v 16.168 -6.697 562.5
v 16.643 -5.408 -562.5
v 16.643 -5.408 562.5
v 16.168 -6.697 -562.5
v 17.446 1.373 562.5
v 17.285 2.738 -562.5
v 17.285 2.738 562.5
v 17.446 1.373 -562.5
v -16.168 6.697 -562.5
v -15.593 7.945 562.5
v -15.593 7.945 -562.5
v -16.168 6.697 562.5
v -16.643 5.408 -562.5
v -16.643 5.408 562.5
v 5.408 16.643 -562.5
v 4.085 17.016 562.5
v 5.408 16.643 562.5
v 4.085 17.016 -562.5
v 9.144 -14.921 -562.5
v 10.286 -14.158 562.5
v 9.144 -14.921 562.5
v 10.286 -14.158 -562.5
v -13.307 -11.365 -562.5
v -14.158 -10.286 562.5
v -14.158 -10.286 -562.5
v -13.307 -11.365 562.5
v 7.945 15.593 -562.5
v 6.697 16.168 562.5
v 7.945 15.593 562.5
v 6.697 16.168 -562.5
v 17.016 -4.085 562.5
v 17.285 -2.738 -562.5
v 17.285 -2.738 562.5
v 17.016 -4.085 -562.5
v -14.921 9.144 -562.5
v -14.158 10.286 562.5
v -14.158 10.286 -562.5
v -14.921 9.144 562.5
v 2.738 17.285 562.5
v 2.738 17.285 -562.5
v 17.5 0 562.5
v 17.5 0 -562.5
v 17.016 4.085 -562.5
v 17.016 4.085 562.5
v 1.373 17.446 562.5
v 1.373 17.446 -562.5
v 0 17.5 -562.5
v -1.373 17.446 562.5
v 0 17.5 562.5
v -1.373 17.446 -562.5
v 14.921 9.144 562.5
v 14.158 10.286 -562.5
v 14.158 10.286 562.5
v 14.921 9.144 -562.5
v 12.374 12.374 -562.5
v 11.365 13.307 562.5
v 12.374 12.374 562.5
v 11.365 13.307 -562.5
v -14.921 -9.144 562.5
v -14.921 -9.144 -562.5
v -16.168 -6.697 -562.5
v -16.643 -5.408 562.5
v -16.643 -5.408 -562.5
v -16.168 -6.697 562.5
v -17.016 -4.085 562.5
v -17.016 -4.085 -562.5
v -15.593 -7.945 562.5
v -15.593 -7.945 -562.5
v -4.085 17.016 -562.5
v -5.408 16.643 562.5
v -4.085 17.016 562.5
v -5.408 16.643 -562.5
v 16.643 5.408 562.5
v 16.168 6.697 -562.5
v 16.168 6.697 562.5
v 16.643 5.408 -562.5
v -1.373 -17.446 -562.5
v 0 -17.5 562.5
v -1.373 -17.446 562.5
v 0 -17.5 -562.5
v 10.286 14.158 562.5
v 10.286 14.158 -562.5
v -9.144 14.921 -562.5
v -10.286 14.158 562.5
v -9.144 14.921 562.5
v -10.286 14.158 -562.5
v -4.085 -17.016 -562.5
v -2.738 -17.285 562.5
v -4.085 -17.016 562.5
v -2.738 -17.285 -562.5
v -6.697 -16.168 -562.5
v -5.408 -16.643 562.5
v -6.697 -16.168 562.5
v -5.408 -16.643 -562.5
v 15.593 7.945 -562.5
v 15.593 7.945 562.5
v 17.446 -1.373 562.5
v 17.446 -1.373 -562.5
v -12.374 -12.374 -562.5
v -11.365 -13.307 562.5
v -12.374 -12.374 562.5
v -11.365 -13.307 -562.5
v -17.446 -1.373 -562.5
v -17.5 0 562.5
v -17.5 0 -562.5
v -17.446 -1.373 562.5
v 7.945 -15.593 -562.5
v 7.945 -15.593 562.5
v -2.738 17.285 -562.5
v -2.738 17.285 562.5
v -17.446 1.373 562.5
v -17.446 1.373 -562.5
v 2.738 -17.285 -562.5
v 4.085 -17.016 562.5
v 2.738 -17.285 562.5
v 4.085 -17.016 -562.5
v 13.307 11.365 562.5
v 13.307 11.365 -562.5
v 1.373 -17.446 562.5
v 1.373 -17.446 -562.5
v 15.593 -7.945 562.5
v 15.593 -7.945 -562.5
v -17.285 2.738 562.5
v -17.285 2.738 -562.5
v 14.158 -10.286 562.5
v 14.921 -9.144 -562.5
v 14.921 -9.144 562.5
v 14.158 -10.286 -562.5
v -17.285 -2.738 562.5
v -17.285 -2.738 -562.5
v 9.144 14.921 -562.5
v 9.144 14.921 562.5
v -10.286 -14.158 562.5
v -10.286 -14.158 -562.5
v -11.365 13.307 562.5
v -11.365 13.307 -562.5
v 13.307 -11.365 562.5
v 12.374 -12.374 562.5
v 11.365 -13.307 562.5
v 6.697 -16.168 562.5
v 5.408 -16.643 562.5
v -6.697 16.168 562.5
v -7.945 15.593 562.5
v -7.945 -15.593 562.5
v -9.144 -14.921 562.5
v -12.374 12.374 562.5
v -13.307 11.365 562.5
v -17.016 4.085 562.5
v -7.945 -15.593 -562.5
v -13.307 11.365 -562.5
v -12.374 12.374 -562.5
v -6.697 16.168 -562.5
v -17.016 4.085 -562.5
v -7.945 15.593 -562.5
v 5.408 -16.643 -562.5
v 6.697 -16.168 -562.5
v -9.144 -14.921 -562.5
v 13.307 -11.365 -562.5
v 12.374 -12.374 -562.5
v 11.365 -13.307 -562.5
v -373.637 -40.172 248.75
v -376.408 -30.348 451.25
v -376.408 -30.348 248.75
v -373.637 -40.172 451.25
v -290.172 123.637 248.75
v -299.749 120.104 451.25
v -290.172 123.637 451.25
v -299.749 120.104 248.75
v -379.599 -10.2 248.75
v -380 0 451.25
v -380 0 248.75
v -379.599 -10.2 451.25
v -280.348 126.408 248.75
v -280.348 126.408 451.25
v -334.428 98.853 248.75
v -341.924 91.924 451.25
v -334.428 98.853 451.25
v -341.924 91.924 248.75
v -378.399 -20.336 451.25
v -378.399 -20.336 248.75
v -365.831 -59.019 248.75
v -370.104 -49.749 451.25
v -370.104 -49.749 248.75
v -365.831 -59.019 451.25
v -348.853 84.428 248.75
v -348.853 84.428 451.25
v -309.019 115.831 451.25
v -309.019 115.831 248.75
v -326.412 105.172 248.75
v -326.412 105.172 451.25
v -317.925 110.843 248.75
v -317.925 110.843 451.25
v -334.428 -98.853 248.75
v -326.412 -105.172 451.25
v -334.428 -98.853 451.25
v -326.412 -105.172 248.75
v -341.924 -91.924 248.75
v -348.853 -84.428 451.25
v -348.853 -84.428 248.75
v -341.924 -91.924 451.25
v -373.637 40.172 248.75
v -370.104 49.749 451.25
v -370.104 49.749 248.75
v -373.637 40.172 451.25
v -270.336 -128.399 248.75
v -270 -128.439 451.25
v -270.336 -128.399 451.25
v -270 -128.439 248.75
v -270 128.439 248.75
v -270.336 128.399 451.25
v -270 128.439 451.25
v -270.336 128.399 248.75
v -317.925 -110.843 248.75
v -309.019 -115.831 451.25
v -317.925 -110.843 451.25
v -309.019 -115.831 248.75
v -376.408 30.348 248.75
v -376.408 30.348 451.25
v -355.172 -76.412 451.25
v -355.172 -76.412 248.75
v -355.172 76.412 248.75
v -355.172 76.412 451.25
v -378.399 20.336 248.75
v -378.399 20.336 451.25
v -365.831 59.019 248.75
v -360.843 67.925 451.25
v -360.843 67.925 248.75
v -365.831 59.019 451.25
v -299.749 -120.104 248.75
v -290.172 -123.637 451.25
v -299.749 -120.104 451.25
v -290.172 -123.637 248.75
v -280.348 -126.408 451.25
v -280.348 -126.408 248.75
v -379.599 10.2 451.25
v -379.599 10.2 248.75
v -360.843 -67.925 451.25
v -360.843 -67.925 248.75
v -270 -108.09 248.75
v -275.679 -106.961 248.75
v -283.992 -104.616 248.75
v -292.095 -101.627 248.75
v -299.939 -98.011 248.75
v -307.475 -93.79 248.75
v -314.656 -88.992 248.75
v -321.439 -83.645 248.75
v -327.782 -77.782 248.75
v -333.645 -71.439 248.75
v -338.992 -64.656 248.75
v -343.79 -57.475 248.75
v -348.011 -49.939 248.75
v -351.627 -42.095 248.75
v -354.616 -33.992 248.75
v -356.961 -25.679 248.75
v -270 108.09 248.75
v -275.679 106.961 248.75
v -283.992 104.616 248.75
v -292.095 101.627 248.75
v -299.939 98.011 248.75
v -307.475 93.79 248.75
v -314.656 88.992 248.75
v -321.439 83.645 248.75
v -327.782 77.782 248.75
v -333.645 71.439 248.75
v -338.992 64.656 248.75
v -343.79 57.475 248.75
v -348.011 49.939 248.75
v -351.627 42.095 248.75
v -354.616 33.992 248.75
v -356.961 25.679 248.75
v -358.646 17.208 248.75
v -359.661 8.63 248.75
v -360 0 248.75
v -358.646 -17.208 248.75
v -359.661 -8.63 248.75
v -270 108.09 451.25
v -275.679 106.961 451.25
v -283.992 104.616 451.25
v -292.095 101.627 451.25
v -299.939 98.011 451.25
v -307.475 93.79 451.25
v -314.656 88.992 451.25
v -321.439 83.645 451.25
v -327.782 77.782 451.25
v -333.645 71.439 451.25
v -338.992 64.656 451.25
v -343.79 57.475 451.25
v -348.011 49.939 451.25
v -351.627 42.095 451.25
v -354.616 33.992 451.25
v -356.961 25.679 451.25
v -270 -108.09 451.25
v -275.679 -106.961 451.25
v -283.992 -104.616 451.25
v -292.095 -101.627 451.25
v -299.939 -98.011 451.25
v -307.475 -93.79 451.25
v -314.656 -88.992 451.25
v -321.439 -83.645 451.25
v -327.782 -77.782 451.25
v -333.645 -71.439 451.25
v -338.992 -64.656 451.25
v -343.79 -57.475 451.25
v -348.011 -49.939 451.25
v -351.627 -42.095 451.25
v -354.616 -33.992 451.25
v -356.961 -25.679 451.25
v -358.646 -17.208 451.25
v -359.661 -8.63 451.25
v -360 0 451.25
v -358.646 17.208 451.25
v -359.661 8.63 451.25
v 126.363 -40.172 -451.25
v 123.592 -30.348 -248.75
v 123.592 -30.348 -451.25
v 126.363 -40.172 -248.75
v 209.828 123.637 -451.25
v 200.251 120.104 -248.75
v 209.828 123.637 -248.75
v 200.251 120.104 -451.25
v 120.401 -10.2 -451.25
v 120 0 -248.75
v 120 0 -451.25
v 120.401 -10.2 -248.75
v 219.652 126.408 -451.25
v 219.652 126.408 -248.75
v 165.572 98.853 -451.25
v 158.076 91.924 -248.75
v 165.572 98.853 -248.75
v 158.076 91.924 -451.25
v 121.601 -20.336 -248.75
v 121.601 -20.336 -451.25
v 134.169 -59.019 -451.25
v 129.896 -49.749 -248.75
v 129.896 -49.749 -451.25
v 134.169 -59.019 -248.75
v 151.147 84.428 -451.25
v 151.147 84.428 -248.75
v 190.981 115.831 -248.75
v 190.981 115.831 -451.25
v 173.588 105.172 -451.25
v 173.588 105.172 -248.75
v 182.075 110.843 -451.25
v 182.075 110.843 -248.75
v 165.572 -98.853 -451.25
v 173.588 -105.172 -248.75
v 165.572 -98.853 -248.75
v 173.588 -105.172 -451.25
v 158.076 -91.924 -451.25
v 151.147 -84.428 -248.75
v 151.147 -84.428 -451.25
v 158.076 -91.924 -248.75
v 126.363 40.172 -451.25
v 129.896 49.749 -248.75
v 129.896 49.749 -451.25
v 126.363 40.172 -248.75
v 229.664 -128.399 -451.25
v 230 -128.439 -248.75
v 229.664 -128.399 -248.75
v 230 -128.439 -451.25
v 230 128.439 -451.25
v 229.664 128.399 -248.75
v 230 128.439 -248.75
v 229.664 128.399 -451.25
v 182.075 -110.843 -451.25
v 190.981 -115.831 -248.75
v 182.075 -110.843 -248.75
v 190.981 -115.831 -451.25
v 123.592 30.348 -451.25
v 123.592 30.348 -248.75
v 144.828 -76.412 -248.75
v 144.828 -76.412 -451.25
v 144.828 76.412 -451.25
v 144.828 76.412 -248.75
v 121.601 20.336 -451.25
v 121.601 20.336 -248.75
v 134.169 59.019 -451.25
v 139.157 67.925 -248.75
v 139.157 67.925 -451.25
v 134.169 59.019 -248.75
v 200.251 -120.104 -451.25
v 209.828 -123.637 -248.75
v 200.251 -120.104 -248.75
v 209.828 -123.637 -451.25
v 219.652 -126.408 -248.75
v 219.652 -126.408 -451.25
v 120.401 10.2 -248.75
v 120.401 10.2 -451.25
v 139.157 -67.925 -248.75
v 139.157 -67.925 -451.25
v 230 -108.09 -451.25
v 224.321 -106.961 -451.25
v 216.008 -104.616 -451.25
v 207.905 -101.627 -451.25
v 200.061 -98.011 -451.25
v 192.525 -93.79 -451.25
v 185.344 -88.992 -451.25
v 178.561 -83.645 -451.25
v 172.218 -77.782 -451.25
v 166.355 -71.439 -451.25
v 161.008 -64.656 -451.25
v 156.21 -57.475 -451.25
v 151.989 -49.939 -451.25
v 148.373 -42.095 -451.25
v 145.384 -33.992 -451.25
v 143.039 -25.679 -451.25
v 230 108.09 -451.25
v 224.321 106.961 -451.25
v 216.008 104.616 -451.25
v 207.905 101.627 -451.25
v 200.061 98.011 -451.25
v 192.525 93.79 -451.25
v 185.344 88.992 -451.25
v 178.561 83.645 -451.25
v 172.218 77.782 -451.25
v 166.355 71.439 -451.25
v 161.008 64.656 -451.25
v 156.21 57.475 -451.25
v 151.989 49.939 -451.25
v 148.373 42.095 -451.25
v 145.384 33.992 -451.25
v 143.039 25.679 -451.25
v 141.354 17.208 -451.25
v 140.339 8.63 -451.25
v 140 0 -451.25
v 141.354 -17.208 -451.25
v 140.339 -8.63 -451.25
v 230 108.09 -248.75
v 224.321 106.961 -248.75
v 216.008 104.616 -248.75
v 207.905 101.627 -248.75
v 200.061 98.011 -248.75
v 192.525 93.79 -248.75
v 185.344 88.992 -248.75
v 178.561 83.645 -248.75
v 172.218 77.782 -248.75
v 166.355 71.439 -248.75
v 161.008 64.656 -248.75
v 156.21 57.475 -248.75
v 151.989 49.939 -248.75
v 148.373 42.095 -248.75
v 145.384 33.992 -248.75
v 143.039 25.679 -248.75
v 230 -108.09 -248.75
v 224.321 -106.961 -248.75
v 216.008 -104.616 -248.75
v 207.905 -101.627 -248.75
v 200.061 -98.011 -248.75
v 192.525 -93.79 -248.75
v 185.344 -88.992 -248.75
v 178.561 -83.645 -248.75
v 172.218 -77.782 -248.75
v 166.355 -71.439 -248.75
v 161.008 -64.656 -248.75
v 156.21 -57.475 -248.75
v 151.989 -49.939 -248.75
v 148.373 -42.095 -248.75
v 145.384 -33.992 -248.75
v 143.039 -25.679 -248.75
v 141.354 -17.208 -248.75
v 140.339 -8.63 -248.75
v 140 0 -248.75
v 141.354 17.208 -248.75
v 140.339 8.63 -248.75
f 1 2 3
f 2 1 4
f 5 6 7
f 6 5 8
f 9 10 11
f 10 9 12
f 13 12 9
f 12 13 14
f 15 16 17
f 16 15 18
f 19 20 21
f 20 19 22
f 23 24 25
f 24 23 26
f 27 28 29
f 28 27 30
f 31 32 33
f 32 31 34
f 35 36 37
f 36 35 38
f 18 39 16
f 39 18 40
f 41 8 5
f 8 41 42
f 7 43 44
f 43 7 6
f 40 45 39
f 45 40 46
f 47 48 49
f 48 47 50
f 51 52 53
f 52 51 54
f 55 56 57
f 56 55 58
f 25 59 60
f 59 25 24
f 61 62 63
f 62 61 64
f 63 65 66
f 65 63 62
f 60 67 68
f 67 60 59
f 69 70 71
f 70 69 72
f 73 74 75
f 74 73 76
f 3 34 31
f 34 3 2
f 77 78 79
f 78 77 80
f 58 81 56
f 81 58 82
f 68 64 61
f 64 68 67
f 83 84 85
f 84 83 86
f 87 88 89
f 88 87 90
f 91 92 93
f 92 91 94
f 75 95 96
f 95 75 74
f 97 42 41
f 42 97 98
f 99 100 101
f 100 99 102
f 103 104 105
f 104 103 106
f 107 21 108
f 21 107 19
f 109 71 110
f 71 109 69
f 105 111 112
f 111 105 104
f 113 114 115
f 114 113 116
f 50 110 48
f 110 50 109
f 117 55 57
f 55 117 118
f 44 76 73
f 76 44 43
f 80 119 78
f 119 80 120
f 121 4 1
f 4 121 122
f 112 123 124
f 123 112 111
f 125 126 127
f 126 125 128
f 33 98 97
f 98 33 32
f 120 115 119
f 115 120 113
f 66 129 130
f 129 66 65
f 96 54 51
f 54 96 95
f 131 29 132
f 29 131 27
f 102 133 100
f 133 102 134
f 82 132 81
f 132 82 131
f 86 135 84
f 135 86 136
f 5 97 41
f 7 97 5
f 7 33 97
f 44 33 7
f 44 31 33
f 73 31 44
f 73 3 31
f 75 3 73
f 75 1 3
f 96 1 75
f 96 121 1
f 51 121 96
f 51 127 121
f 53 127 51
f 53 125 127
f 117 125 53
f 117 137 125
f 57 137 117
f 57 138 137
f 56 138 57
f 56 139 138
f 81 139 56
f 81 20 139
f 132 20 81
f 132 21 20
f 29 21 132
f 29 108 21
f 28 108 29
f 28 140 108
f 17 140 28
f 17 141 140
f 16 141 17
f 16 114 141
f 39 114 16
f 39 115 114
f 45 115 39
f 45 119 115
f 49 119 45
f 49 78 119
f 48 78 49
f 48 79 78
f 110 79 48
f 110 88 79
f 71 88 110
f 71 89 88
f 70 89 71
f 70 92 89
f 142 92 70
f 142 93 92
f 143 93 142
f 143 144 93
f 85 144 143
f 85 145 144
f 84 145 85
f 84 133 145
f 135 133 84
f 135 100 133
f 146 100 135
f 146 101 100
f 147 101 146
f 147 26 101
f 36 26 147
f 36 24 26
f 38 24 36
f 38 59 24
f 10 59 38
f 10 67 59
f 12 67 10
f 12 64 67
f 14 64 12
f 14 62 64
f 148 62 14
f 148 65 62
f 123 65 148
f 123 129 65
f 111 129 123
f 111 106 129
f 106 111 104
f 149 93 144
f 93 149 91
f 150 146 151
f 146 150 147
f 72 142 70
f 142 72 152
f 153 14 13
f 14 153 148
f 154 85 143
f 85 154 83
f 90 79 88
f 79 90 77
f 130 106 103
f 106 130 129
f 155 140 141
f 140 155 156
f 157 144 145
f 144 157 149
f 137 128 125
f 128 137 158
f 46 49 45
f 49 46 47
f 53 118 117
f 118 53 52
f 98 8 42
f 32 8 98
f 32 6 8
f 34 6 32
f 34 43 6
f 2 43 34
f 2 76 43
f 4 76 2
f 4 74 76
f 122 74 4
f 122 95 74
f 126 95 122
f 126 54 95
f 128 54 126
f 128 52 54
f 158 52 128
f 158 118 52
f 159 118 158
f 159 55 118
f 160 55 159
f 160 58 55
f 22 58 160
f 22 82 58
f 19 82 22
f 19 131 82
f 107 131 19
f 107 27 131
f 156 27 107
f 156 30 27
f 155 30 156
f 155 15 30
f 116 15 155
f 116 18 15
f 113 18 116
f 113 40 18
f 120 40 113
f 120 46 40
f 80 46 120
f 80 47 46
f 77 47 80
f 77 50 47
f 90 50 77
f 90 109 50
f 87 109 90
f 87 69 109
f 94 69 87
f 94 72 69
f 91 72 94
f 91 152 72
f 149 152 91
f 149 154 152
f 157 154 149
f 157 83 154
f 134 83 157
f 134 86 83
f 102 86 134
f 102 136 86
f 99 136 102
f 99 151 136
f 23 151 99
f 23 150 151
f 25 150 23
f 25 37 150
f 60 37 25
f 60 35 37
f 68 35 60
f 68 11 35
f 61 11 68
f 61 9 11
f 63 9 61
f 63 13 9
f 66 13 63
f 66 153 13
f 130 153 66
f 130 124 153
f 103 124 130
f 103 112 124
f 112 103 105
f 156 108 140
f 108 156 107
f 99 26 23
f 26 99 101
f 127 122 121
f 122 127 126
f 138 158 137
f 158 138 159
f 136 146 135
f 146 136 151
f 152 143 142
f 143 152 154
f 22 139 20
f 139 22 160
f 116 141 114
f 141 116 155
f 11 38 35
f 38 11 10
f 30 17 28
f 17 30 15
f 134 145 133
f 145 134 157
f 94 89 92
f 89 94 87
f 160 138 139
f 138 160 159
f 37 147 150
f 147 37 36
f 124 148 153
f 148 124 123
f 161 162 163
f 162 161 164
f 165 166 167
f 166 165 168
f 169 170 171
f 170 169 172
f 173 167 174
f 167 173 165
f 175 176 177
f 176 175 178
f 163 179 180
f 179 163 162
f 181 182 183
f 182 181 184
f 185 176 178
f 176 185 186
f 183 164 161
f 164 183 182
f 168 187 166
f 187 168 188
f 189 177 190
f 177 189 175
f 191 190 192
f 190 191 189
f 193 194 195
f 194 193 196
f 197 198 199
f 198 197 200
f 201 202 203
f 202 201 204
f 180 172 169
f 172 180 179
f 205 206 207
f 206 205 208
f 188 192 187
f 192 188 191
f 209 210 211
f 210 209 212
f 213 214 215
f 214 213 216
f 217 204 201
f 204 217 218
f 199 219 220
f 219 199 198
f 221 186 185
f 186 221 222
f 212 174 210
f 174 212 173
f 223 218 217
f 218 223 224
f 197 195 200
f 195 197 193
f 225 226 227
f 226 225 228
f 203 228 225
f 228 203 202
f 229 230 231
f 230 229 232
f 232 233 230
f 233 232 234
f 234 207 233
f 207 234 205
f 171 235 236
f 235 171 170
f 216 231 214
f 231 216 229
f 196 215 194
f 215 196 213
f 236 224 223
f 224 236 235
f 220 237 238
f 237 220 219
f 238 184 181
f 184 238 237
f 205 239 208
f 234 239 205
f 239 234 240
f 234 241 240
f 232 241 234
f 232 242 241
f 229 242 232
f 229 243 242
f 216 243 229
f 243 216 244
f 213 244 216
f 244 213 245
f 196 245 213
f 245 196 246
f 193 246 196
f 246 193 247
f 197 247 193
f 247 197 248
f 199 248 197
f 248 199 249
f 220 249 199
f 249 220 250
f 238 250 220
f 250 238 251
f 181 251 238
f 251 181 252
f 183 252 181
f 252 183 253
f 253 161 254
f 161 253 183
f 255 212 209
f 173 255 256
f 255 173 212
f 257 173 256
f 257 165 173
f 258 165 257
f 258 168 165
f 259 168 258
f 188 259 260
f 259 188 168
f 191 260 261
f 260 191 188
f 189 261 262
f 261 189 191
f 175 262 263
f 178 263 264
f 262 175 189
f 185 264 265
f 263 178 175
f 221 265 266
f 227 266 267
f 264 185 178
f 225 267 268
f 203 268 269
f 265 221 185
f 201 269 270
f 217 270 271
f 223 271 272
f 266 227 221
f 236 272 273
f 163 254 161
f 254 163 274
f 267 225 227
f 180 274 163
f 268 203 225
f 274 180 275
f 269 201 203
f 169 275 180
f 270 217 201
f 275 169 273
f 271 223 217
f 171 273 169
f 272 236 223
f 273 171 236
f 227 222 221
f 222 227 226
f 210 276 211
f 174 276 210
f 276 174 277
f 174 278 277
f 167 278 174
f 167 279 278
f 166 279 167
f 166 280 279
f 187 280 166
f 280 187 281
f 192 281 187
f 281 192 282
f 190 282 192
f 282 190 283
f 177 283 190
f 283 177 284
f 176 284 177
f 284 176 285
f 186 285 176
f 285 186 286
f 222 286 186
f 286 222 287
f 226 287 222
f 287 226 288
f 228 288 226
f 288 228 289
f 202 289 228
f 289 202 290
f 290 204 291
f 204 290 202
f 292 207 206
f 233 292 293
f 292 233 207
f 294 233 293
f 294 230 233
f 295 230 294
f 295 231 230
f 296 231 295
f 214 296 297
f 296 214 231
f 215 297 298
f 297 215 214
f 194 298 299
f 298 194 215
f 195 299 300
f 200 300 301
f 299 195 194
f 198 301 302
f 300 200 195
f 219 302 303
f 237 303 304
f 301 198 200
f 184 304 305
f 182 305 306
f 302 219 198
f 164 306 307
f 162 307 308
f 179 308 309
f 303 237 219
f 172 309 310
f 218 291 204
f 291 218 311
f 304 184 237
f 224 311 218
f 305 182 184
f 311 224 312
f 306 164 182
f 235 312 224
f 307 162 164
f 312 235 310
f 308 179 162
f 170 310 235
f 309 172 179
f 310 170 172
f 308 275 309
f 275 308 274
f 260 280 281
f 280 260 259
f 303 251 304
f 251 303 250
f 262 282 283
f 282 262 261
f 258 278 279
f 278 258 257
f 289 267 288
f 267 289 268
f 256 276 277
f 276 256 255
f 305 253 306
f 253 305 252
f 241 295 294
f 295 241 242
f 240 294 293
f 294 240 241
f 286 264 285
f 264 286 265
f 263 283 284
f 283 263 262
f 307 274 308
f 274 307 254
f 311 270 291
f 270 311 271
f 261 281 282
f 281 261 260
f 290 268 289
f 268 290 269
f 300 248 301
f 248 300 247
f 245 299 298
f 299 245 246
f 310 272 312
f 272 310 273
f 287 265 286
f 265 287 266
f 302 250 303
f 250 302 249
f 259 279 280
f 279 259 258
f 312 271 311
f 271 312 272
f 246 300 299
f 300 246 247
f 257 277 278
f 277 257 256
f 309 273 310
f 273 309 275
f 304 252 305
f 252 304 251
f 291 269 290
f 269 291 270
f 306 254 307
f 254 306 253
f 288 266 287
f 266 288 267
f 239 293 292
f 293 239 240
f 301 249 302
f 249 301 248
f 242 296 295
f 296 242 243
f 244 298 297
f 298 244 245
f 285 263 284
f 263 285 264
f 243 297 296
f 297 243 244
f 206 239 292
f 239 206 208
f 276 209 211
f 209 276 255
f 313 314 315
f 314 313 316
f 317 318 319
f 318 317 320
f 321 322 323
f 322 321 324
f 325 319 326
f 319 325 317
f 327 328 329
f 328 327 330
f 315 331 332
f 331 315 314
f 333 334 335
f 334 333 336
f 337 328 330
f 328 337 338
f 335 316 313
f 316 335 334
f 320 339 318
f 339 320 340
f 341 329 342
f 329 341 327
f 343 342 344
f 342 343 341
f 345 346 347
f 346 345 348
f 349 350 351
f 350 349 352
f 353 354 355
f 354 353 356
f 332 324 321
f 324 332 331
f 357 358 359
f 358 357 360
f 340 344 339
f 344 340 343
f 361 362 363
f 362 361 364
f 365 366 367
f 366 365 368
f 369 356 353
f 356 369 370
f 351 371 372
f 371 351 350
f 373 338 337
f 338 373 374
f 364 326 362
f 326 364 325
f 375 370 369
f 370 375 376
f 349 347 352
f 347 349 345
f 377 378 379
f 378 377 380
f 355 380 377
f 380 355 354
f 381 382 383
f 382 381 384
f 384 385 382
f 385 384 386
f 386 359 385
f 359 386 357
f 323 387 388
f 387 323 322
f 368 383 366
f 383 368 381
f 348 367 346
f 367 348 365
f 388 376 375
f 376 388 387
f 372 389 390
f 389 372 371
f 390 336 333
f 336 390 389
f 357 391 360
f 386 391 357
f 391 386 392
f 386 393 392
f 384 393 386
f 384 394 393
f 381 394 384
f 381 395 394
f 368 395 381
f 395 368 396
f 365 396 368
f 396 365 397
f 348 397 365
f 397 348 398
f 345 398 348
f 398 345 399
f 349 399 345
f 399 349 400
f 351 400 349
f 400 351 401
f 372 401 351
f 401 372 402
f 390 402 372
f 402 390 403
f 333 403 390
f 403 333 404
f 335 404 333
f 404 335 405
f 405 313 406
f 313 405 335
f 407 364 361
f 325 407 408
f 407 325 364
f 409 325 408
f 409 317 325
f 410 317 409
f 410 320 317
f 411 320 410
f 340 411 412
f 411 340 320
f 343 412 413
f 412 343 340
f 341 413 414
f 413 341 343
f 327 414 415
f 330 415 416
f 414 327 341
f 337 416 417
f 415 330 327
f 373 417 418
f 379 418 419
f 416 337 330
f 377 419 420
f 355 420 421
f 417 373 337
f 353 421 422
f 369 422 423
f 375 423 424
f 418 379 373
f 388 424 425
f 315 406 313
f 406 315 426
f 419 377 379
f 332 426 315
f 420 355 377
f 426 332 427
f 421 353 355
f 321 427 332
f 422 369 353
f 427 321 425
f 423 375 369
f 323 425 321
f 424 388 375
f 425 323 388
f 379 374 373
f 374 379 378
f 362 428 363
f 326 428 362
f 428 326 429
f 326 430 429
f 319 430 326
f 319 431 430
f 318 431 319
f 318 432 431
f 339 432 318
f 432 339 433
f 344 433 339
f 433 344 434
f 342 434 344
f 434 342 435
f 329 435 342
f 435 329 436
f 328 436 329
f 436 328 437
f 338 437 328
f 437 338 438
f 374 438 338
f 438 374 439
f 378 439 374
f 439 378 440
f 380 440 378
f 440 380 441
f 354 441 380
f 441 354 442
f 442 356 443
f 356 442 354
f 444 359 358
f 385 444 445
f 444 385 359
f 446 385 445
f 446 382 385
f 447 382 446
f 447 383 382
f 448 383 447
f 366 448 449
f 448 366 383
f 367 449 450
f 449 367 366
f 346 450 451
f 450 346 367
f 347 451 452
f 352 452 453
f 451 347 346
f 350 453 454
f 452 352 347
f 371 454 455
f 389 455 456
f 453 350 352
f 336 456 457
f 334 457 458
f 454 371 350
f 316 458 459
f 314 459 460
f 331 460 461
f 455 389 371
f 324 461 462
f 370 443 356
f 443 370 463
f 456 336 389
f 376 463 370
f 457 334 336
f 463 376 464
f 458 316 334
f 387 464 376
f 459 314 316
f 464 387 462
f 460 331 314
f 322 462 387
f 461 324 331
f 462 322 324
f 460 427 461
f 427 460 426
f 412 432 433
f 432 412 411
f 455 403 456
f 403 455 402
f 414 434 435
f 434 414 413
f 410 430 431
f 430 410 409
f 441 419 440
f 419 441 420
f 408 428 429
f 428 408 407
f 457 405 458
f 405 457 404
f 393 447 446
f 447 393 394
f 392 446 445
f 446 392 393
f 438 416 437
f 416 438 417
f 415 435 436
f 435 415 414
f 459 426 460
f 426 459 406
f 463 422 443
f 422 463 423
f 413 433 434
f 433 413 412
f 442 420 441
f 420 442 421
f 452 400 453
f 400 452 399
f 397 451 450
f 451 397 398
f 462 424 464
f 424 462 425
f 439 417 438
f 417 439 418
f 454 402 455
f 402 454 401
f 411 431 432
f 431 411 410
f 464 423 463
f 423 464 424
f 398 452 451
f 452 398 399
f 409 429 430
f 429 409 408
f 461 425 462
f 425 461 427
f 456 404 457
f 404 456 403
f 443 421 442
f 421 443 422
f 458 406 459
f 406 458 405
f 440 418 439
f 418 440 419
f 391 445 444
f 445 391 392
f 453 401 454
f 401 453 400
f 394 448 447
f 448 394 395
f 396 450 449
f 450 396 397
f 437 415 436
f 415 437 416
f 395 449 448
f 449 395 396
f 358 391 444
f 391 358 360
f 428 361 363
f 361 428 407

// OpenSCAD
// ============================================================================
// PROJECT: XXXG-00W0 WING GUNDAM ZERO EW - HEAD COMPLIANCE MATRIX
// COMPONENT VAULT: BANDAI CAST RUNNER A - SHADING SLEEVES A7 & VISOR MASKS A8
// ARCHITECTURAL PARITY: GUNDAM SENTINEL DEVELOPMENT DIARY SPECIFICATIONS
// DESIGN METRIC: MASS PROFILE PRE-LOCK FOR CORE DYNAMIC REBALANCING
// ============================================================================

$fn = 80; // Circular segment fidelity calculation count

// Sizing Constants Scaled 1:1 for a 16.7-Meter Airframe Scale (mm)
shading_cowl_height = 450;              // Total vertical tracking span (mm)
sensor_aperture_diameter = 220;         // Inner optical camera opening width (mm)
shading_wall_thickness = 20;            // Lightweight internal titanium shield (mm)
harness_conduit_width = 40;             // Cast-in 4oz copper logic rail track (mm)

module Runner_A_Head_Shading_Forge() {
    // Central Supply Injection Runner Axis (Molten Feed Line from Siphon Forge)
    color([0.22, 0.22, 0.25]) {
        cylinder(h = shading_cowl_height * 2.5, d = 35, center = true);
        // Direct injection gates tracking straight into the part mold cavities
        translate() rotate() cylinder(h = 350, d = 18);
        translate([0, 0, -350]) rotate() cylinder(h = 350, d = 18);
    }
    
    // Instantiate Scaled Structural Molds Symmetrically (Left & Right Halves)
    Cast_Internal_Sensor_Shading();
}

module Cast_Internal_Sensor_Shading() {
    // ---- PART A7: LEFT INTERNAL HEAD CAMERA SHADING SLEEVE ---- [Page 124 Diary Specs]
    translate([-250, 0, 350]) color([0.3, 0.3, 0.32]) { // Inner Frame Dark Spec
        difference() {
            // Main cylindrical glare protection cowling block
            cylinder(h = shading_cowl_height * 0.45, d = sensor_aperture_diameter + (shading_wall_thickness * 2), center = true);
            
            // Central Optical Path Boring (Clears targeted tracking vision)
            cylinder(h = shading_cowl_height * 0.5, d = sensor_aperture_diameter, center = true);
            
            // Continuous cast-in routing track for the 4oz solid-state wiring rails
            cube([harness_conduit_width, sensor_aperture_diameter + 50, shading_cowl_height], center = true);
            
            // Slicing profile tool to generate an asymmetrical half-shell part component
            translate([sensor_aperture_diameter, 0, 0])
                cube([sensor_aperture_diameter * 2, sensor_aperture_diameter * 2, shading_cowl_height * 2], center = true);
        }
    }
    
    // ---- PART A8: RIGHT INTERNAL HEAD CAMERA SHADING SLEEVE ---- [Page 124 Diary Specs]
    translate([250, 0, -350]) rotate() color([0.3, 0.3, 0.32]) {
        difference() {
            cylinder(h = shading_cowl_height * 0.45, d = sensor_aperture_diameter + (shading_wall_thickness * 2), center = true);
            cylinder(h = shading_cowl_height * 0.5, d = sensor_aperture_diameter, center = true);
            cube([harness_conduit_width, sensor_aperture_diameter + 50, shading_cowl_height], center = true);
            translate([sensor_aperture_diameter, 0, 0])
                cube([sensor_aperture_diameter * 2, sensor_aperture_diameter * 2, shading_cowl_height * 2], center = true);
        }
    }
}

// Render Finished Module Workspace Framework
Runner_A_Head_Shading_Forge();
